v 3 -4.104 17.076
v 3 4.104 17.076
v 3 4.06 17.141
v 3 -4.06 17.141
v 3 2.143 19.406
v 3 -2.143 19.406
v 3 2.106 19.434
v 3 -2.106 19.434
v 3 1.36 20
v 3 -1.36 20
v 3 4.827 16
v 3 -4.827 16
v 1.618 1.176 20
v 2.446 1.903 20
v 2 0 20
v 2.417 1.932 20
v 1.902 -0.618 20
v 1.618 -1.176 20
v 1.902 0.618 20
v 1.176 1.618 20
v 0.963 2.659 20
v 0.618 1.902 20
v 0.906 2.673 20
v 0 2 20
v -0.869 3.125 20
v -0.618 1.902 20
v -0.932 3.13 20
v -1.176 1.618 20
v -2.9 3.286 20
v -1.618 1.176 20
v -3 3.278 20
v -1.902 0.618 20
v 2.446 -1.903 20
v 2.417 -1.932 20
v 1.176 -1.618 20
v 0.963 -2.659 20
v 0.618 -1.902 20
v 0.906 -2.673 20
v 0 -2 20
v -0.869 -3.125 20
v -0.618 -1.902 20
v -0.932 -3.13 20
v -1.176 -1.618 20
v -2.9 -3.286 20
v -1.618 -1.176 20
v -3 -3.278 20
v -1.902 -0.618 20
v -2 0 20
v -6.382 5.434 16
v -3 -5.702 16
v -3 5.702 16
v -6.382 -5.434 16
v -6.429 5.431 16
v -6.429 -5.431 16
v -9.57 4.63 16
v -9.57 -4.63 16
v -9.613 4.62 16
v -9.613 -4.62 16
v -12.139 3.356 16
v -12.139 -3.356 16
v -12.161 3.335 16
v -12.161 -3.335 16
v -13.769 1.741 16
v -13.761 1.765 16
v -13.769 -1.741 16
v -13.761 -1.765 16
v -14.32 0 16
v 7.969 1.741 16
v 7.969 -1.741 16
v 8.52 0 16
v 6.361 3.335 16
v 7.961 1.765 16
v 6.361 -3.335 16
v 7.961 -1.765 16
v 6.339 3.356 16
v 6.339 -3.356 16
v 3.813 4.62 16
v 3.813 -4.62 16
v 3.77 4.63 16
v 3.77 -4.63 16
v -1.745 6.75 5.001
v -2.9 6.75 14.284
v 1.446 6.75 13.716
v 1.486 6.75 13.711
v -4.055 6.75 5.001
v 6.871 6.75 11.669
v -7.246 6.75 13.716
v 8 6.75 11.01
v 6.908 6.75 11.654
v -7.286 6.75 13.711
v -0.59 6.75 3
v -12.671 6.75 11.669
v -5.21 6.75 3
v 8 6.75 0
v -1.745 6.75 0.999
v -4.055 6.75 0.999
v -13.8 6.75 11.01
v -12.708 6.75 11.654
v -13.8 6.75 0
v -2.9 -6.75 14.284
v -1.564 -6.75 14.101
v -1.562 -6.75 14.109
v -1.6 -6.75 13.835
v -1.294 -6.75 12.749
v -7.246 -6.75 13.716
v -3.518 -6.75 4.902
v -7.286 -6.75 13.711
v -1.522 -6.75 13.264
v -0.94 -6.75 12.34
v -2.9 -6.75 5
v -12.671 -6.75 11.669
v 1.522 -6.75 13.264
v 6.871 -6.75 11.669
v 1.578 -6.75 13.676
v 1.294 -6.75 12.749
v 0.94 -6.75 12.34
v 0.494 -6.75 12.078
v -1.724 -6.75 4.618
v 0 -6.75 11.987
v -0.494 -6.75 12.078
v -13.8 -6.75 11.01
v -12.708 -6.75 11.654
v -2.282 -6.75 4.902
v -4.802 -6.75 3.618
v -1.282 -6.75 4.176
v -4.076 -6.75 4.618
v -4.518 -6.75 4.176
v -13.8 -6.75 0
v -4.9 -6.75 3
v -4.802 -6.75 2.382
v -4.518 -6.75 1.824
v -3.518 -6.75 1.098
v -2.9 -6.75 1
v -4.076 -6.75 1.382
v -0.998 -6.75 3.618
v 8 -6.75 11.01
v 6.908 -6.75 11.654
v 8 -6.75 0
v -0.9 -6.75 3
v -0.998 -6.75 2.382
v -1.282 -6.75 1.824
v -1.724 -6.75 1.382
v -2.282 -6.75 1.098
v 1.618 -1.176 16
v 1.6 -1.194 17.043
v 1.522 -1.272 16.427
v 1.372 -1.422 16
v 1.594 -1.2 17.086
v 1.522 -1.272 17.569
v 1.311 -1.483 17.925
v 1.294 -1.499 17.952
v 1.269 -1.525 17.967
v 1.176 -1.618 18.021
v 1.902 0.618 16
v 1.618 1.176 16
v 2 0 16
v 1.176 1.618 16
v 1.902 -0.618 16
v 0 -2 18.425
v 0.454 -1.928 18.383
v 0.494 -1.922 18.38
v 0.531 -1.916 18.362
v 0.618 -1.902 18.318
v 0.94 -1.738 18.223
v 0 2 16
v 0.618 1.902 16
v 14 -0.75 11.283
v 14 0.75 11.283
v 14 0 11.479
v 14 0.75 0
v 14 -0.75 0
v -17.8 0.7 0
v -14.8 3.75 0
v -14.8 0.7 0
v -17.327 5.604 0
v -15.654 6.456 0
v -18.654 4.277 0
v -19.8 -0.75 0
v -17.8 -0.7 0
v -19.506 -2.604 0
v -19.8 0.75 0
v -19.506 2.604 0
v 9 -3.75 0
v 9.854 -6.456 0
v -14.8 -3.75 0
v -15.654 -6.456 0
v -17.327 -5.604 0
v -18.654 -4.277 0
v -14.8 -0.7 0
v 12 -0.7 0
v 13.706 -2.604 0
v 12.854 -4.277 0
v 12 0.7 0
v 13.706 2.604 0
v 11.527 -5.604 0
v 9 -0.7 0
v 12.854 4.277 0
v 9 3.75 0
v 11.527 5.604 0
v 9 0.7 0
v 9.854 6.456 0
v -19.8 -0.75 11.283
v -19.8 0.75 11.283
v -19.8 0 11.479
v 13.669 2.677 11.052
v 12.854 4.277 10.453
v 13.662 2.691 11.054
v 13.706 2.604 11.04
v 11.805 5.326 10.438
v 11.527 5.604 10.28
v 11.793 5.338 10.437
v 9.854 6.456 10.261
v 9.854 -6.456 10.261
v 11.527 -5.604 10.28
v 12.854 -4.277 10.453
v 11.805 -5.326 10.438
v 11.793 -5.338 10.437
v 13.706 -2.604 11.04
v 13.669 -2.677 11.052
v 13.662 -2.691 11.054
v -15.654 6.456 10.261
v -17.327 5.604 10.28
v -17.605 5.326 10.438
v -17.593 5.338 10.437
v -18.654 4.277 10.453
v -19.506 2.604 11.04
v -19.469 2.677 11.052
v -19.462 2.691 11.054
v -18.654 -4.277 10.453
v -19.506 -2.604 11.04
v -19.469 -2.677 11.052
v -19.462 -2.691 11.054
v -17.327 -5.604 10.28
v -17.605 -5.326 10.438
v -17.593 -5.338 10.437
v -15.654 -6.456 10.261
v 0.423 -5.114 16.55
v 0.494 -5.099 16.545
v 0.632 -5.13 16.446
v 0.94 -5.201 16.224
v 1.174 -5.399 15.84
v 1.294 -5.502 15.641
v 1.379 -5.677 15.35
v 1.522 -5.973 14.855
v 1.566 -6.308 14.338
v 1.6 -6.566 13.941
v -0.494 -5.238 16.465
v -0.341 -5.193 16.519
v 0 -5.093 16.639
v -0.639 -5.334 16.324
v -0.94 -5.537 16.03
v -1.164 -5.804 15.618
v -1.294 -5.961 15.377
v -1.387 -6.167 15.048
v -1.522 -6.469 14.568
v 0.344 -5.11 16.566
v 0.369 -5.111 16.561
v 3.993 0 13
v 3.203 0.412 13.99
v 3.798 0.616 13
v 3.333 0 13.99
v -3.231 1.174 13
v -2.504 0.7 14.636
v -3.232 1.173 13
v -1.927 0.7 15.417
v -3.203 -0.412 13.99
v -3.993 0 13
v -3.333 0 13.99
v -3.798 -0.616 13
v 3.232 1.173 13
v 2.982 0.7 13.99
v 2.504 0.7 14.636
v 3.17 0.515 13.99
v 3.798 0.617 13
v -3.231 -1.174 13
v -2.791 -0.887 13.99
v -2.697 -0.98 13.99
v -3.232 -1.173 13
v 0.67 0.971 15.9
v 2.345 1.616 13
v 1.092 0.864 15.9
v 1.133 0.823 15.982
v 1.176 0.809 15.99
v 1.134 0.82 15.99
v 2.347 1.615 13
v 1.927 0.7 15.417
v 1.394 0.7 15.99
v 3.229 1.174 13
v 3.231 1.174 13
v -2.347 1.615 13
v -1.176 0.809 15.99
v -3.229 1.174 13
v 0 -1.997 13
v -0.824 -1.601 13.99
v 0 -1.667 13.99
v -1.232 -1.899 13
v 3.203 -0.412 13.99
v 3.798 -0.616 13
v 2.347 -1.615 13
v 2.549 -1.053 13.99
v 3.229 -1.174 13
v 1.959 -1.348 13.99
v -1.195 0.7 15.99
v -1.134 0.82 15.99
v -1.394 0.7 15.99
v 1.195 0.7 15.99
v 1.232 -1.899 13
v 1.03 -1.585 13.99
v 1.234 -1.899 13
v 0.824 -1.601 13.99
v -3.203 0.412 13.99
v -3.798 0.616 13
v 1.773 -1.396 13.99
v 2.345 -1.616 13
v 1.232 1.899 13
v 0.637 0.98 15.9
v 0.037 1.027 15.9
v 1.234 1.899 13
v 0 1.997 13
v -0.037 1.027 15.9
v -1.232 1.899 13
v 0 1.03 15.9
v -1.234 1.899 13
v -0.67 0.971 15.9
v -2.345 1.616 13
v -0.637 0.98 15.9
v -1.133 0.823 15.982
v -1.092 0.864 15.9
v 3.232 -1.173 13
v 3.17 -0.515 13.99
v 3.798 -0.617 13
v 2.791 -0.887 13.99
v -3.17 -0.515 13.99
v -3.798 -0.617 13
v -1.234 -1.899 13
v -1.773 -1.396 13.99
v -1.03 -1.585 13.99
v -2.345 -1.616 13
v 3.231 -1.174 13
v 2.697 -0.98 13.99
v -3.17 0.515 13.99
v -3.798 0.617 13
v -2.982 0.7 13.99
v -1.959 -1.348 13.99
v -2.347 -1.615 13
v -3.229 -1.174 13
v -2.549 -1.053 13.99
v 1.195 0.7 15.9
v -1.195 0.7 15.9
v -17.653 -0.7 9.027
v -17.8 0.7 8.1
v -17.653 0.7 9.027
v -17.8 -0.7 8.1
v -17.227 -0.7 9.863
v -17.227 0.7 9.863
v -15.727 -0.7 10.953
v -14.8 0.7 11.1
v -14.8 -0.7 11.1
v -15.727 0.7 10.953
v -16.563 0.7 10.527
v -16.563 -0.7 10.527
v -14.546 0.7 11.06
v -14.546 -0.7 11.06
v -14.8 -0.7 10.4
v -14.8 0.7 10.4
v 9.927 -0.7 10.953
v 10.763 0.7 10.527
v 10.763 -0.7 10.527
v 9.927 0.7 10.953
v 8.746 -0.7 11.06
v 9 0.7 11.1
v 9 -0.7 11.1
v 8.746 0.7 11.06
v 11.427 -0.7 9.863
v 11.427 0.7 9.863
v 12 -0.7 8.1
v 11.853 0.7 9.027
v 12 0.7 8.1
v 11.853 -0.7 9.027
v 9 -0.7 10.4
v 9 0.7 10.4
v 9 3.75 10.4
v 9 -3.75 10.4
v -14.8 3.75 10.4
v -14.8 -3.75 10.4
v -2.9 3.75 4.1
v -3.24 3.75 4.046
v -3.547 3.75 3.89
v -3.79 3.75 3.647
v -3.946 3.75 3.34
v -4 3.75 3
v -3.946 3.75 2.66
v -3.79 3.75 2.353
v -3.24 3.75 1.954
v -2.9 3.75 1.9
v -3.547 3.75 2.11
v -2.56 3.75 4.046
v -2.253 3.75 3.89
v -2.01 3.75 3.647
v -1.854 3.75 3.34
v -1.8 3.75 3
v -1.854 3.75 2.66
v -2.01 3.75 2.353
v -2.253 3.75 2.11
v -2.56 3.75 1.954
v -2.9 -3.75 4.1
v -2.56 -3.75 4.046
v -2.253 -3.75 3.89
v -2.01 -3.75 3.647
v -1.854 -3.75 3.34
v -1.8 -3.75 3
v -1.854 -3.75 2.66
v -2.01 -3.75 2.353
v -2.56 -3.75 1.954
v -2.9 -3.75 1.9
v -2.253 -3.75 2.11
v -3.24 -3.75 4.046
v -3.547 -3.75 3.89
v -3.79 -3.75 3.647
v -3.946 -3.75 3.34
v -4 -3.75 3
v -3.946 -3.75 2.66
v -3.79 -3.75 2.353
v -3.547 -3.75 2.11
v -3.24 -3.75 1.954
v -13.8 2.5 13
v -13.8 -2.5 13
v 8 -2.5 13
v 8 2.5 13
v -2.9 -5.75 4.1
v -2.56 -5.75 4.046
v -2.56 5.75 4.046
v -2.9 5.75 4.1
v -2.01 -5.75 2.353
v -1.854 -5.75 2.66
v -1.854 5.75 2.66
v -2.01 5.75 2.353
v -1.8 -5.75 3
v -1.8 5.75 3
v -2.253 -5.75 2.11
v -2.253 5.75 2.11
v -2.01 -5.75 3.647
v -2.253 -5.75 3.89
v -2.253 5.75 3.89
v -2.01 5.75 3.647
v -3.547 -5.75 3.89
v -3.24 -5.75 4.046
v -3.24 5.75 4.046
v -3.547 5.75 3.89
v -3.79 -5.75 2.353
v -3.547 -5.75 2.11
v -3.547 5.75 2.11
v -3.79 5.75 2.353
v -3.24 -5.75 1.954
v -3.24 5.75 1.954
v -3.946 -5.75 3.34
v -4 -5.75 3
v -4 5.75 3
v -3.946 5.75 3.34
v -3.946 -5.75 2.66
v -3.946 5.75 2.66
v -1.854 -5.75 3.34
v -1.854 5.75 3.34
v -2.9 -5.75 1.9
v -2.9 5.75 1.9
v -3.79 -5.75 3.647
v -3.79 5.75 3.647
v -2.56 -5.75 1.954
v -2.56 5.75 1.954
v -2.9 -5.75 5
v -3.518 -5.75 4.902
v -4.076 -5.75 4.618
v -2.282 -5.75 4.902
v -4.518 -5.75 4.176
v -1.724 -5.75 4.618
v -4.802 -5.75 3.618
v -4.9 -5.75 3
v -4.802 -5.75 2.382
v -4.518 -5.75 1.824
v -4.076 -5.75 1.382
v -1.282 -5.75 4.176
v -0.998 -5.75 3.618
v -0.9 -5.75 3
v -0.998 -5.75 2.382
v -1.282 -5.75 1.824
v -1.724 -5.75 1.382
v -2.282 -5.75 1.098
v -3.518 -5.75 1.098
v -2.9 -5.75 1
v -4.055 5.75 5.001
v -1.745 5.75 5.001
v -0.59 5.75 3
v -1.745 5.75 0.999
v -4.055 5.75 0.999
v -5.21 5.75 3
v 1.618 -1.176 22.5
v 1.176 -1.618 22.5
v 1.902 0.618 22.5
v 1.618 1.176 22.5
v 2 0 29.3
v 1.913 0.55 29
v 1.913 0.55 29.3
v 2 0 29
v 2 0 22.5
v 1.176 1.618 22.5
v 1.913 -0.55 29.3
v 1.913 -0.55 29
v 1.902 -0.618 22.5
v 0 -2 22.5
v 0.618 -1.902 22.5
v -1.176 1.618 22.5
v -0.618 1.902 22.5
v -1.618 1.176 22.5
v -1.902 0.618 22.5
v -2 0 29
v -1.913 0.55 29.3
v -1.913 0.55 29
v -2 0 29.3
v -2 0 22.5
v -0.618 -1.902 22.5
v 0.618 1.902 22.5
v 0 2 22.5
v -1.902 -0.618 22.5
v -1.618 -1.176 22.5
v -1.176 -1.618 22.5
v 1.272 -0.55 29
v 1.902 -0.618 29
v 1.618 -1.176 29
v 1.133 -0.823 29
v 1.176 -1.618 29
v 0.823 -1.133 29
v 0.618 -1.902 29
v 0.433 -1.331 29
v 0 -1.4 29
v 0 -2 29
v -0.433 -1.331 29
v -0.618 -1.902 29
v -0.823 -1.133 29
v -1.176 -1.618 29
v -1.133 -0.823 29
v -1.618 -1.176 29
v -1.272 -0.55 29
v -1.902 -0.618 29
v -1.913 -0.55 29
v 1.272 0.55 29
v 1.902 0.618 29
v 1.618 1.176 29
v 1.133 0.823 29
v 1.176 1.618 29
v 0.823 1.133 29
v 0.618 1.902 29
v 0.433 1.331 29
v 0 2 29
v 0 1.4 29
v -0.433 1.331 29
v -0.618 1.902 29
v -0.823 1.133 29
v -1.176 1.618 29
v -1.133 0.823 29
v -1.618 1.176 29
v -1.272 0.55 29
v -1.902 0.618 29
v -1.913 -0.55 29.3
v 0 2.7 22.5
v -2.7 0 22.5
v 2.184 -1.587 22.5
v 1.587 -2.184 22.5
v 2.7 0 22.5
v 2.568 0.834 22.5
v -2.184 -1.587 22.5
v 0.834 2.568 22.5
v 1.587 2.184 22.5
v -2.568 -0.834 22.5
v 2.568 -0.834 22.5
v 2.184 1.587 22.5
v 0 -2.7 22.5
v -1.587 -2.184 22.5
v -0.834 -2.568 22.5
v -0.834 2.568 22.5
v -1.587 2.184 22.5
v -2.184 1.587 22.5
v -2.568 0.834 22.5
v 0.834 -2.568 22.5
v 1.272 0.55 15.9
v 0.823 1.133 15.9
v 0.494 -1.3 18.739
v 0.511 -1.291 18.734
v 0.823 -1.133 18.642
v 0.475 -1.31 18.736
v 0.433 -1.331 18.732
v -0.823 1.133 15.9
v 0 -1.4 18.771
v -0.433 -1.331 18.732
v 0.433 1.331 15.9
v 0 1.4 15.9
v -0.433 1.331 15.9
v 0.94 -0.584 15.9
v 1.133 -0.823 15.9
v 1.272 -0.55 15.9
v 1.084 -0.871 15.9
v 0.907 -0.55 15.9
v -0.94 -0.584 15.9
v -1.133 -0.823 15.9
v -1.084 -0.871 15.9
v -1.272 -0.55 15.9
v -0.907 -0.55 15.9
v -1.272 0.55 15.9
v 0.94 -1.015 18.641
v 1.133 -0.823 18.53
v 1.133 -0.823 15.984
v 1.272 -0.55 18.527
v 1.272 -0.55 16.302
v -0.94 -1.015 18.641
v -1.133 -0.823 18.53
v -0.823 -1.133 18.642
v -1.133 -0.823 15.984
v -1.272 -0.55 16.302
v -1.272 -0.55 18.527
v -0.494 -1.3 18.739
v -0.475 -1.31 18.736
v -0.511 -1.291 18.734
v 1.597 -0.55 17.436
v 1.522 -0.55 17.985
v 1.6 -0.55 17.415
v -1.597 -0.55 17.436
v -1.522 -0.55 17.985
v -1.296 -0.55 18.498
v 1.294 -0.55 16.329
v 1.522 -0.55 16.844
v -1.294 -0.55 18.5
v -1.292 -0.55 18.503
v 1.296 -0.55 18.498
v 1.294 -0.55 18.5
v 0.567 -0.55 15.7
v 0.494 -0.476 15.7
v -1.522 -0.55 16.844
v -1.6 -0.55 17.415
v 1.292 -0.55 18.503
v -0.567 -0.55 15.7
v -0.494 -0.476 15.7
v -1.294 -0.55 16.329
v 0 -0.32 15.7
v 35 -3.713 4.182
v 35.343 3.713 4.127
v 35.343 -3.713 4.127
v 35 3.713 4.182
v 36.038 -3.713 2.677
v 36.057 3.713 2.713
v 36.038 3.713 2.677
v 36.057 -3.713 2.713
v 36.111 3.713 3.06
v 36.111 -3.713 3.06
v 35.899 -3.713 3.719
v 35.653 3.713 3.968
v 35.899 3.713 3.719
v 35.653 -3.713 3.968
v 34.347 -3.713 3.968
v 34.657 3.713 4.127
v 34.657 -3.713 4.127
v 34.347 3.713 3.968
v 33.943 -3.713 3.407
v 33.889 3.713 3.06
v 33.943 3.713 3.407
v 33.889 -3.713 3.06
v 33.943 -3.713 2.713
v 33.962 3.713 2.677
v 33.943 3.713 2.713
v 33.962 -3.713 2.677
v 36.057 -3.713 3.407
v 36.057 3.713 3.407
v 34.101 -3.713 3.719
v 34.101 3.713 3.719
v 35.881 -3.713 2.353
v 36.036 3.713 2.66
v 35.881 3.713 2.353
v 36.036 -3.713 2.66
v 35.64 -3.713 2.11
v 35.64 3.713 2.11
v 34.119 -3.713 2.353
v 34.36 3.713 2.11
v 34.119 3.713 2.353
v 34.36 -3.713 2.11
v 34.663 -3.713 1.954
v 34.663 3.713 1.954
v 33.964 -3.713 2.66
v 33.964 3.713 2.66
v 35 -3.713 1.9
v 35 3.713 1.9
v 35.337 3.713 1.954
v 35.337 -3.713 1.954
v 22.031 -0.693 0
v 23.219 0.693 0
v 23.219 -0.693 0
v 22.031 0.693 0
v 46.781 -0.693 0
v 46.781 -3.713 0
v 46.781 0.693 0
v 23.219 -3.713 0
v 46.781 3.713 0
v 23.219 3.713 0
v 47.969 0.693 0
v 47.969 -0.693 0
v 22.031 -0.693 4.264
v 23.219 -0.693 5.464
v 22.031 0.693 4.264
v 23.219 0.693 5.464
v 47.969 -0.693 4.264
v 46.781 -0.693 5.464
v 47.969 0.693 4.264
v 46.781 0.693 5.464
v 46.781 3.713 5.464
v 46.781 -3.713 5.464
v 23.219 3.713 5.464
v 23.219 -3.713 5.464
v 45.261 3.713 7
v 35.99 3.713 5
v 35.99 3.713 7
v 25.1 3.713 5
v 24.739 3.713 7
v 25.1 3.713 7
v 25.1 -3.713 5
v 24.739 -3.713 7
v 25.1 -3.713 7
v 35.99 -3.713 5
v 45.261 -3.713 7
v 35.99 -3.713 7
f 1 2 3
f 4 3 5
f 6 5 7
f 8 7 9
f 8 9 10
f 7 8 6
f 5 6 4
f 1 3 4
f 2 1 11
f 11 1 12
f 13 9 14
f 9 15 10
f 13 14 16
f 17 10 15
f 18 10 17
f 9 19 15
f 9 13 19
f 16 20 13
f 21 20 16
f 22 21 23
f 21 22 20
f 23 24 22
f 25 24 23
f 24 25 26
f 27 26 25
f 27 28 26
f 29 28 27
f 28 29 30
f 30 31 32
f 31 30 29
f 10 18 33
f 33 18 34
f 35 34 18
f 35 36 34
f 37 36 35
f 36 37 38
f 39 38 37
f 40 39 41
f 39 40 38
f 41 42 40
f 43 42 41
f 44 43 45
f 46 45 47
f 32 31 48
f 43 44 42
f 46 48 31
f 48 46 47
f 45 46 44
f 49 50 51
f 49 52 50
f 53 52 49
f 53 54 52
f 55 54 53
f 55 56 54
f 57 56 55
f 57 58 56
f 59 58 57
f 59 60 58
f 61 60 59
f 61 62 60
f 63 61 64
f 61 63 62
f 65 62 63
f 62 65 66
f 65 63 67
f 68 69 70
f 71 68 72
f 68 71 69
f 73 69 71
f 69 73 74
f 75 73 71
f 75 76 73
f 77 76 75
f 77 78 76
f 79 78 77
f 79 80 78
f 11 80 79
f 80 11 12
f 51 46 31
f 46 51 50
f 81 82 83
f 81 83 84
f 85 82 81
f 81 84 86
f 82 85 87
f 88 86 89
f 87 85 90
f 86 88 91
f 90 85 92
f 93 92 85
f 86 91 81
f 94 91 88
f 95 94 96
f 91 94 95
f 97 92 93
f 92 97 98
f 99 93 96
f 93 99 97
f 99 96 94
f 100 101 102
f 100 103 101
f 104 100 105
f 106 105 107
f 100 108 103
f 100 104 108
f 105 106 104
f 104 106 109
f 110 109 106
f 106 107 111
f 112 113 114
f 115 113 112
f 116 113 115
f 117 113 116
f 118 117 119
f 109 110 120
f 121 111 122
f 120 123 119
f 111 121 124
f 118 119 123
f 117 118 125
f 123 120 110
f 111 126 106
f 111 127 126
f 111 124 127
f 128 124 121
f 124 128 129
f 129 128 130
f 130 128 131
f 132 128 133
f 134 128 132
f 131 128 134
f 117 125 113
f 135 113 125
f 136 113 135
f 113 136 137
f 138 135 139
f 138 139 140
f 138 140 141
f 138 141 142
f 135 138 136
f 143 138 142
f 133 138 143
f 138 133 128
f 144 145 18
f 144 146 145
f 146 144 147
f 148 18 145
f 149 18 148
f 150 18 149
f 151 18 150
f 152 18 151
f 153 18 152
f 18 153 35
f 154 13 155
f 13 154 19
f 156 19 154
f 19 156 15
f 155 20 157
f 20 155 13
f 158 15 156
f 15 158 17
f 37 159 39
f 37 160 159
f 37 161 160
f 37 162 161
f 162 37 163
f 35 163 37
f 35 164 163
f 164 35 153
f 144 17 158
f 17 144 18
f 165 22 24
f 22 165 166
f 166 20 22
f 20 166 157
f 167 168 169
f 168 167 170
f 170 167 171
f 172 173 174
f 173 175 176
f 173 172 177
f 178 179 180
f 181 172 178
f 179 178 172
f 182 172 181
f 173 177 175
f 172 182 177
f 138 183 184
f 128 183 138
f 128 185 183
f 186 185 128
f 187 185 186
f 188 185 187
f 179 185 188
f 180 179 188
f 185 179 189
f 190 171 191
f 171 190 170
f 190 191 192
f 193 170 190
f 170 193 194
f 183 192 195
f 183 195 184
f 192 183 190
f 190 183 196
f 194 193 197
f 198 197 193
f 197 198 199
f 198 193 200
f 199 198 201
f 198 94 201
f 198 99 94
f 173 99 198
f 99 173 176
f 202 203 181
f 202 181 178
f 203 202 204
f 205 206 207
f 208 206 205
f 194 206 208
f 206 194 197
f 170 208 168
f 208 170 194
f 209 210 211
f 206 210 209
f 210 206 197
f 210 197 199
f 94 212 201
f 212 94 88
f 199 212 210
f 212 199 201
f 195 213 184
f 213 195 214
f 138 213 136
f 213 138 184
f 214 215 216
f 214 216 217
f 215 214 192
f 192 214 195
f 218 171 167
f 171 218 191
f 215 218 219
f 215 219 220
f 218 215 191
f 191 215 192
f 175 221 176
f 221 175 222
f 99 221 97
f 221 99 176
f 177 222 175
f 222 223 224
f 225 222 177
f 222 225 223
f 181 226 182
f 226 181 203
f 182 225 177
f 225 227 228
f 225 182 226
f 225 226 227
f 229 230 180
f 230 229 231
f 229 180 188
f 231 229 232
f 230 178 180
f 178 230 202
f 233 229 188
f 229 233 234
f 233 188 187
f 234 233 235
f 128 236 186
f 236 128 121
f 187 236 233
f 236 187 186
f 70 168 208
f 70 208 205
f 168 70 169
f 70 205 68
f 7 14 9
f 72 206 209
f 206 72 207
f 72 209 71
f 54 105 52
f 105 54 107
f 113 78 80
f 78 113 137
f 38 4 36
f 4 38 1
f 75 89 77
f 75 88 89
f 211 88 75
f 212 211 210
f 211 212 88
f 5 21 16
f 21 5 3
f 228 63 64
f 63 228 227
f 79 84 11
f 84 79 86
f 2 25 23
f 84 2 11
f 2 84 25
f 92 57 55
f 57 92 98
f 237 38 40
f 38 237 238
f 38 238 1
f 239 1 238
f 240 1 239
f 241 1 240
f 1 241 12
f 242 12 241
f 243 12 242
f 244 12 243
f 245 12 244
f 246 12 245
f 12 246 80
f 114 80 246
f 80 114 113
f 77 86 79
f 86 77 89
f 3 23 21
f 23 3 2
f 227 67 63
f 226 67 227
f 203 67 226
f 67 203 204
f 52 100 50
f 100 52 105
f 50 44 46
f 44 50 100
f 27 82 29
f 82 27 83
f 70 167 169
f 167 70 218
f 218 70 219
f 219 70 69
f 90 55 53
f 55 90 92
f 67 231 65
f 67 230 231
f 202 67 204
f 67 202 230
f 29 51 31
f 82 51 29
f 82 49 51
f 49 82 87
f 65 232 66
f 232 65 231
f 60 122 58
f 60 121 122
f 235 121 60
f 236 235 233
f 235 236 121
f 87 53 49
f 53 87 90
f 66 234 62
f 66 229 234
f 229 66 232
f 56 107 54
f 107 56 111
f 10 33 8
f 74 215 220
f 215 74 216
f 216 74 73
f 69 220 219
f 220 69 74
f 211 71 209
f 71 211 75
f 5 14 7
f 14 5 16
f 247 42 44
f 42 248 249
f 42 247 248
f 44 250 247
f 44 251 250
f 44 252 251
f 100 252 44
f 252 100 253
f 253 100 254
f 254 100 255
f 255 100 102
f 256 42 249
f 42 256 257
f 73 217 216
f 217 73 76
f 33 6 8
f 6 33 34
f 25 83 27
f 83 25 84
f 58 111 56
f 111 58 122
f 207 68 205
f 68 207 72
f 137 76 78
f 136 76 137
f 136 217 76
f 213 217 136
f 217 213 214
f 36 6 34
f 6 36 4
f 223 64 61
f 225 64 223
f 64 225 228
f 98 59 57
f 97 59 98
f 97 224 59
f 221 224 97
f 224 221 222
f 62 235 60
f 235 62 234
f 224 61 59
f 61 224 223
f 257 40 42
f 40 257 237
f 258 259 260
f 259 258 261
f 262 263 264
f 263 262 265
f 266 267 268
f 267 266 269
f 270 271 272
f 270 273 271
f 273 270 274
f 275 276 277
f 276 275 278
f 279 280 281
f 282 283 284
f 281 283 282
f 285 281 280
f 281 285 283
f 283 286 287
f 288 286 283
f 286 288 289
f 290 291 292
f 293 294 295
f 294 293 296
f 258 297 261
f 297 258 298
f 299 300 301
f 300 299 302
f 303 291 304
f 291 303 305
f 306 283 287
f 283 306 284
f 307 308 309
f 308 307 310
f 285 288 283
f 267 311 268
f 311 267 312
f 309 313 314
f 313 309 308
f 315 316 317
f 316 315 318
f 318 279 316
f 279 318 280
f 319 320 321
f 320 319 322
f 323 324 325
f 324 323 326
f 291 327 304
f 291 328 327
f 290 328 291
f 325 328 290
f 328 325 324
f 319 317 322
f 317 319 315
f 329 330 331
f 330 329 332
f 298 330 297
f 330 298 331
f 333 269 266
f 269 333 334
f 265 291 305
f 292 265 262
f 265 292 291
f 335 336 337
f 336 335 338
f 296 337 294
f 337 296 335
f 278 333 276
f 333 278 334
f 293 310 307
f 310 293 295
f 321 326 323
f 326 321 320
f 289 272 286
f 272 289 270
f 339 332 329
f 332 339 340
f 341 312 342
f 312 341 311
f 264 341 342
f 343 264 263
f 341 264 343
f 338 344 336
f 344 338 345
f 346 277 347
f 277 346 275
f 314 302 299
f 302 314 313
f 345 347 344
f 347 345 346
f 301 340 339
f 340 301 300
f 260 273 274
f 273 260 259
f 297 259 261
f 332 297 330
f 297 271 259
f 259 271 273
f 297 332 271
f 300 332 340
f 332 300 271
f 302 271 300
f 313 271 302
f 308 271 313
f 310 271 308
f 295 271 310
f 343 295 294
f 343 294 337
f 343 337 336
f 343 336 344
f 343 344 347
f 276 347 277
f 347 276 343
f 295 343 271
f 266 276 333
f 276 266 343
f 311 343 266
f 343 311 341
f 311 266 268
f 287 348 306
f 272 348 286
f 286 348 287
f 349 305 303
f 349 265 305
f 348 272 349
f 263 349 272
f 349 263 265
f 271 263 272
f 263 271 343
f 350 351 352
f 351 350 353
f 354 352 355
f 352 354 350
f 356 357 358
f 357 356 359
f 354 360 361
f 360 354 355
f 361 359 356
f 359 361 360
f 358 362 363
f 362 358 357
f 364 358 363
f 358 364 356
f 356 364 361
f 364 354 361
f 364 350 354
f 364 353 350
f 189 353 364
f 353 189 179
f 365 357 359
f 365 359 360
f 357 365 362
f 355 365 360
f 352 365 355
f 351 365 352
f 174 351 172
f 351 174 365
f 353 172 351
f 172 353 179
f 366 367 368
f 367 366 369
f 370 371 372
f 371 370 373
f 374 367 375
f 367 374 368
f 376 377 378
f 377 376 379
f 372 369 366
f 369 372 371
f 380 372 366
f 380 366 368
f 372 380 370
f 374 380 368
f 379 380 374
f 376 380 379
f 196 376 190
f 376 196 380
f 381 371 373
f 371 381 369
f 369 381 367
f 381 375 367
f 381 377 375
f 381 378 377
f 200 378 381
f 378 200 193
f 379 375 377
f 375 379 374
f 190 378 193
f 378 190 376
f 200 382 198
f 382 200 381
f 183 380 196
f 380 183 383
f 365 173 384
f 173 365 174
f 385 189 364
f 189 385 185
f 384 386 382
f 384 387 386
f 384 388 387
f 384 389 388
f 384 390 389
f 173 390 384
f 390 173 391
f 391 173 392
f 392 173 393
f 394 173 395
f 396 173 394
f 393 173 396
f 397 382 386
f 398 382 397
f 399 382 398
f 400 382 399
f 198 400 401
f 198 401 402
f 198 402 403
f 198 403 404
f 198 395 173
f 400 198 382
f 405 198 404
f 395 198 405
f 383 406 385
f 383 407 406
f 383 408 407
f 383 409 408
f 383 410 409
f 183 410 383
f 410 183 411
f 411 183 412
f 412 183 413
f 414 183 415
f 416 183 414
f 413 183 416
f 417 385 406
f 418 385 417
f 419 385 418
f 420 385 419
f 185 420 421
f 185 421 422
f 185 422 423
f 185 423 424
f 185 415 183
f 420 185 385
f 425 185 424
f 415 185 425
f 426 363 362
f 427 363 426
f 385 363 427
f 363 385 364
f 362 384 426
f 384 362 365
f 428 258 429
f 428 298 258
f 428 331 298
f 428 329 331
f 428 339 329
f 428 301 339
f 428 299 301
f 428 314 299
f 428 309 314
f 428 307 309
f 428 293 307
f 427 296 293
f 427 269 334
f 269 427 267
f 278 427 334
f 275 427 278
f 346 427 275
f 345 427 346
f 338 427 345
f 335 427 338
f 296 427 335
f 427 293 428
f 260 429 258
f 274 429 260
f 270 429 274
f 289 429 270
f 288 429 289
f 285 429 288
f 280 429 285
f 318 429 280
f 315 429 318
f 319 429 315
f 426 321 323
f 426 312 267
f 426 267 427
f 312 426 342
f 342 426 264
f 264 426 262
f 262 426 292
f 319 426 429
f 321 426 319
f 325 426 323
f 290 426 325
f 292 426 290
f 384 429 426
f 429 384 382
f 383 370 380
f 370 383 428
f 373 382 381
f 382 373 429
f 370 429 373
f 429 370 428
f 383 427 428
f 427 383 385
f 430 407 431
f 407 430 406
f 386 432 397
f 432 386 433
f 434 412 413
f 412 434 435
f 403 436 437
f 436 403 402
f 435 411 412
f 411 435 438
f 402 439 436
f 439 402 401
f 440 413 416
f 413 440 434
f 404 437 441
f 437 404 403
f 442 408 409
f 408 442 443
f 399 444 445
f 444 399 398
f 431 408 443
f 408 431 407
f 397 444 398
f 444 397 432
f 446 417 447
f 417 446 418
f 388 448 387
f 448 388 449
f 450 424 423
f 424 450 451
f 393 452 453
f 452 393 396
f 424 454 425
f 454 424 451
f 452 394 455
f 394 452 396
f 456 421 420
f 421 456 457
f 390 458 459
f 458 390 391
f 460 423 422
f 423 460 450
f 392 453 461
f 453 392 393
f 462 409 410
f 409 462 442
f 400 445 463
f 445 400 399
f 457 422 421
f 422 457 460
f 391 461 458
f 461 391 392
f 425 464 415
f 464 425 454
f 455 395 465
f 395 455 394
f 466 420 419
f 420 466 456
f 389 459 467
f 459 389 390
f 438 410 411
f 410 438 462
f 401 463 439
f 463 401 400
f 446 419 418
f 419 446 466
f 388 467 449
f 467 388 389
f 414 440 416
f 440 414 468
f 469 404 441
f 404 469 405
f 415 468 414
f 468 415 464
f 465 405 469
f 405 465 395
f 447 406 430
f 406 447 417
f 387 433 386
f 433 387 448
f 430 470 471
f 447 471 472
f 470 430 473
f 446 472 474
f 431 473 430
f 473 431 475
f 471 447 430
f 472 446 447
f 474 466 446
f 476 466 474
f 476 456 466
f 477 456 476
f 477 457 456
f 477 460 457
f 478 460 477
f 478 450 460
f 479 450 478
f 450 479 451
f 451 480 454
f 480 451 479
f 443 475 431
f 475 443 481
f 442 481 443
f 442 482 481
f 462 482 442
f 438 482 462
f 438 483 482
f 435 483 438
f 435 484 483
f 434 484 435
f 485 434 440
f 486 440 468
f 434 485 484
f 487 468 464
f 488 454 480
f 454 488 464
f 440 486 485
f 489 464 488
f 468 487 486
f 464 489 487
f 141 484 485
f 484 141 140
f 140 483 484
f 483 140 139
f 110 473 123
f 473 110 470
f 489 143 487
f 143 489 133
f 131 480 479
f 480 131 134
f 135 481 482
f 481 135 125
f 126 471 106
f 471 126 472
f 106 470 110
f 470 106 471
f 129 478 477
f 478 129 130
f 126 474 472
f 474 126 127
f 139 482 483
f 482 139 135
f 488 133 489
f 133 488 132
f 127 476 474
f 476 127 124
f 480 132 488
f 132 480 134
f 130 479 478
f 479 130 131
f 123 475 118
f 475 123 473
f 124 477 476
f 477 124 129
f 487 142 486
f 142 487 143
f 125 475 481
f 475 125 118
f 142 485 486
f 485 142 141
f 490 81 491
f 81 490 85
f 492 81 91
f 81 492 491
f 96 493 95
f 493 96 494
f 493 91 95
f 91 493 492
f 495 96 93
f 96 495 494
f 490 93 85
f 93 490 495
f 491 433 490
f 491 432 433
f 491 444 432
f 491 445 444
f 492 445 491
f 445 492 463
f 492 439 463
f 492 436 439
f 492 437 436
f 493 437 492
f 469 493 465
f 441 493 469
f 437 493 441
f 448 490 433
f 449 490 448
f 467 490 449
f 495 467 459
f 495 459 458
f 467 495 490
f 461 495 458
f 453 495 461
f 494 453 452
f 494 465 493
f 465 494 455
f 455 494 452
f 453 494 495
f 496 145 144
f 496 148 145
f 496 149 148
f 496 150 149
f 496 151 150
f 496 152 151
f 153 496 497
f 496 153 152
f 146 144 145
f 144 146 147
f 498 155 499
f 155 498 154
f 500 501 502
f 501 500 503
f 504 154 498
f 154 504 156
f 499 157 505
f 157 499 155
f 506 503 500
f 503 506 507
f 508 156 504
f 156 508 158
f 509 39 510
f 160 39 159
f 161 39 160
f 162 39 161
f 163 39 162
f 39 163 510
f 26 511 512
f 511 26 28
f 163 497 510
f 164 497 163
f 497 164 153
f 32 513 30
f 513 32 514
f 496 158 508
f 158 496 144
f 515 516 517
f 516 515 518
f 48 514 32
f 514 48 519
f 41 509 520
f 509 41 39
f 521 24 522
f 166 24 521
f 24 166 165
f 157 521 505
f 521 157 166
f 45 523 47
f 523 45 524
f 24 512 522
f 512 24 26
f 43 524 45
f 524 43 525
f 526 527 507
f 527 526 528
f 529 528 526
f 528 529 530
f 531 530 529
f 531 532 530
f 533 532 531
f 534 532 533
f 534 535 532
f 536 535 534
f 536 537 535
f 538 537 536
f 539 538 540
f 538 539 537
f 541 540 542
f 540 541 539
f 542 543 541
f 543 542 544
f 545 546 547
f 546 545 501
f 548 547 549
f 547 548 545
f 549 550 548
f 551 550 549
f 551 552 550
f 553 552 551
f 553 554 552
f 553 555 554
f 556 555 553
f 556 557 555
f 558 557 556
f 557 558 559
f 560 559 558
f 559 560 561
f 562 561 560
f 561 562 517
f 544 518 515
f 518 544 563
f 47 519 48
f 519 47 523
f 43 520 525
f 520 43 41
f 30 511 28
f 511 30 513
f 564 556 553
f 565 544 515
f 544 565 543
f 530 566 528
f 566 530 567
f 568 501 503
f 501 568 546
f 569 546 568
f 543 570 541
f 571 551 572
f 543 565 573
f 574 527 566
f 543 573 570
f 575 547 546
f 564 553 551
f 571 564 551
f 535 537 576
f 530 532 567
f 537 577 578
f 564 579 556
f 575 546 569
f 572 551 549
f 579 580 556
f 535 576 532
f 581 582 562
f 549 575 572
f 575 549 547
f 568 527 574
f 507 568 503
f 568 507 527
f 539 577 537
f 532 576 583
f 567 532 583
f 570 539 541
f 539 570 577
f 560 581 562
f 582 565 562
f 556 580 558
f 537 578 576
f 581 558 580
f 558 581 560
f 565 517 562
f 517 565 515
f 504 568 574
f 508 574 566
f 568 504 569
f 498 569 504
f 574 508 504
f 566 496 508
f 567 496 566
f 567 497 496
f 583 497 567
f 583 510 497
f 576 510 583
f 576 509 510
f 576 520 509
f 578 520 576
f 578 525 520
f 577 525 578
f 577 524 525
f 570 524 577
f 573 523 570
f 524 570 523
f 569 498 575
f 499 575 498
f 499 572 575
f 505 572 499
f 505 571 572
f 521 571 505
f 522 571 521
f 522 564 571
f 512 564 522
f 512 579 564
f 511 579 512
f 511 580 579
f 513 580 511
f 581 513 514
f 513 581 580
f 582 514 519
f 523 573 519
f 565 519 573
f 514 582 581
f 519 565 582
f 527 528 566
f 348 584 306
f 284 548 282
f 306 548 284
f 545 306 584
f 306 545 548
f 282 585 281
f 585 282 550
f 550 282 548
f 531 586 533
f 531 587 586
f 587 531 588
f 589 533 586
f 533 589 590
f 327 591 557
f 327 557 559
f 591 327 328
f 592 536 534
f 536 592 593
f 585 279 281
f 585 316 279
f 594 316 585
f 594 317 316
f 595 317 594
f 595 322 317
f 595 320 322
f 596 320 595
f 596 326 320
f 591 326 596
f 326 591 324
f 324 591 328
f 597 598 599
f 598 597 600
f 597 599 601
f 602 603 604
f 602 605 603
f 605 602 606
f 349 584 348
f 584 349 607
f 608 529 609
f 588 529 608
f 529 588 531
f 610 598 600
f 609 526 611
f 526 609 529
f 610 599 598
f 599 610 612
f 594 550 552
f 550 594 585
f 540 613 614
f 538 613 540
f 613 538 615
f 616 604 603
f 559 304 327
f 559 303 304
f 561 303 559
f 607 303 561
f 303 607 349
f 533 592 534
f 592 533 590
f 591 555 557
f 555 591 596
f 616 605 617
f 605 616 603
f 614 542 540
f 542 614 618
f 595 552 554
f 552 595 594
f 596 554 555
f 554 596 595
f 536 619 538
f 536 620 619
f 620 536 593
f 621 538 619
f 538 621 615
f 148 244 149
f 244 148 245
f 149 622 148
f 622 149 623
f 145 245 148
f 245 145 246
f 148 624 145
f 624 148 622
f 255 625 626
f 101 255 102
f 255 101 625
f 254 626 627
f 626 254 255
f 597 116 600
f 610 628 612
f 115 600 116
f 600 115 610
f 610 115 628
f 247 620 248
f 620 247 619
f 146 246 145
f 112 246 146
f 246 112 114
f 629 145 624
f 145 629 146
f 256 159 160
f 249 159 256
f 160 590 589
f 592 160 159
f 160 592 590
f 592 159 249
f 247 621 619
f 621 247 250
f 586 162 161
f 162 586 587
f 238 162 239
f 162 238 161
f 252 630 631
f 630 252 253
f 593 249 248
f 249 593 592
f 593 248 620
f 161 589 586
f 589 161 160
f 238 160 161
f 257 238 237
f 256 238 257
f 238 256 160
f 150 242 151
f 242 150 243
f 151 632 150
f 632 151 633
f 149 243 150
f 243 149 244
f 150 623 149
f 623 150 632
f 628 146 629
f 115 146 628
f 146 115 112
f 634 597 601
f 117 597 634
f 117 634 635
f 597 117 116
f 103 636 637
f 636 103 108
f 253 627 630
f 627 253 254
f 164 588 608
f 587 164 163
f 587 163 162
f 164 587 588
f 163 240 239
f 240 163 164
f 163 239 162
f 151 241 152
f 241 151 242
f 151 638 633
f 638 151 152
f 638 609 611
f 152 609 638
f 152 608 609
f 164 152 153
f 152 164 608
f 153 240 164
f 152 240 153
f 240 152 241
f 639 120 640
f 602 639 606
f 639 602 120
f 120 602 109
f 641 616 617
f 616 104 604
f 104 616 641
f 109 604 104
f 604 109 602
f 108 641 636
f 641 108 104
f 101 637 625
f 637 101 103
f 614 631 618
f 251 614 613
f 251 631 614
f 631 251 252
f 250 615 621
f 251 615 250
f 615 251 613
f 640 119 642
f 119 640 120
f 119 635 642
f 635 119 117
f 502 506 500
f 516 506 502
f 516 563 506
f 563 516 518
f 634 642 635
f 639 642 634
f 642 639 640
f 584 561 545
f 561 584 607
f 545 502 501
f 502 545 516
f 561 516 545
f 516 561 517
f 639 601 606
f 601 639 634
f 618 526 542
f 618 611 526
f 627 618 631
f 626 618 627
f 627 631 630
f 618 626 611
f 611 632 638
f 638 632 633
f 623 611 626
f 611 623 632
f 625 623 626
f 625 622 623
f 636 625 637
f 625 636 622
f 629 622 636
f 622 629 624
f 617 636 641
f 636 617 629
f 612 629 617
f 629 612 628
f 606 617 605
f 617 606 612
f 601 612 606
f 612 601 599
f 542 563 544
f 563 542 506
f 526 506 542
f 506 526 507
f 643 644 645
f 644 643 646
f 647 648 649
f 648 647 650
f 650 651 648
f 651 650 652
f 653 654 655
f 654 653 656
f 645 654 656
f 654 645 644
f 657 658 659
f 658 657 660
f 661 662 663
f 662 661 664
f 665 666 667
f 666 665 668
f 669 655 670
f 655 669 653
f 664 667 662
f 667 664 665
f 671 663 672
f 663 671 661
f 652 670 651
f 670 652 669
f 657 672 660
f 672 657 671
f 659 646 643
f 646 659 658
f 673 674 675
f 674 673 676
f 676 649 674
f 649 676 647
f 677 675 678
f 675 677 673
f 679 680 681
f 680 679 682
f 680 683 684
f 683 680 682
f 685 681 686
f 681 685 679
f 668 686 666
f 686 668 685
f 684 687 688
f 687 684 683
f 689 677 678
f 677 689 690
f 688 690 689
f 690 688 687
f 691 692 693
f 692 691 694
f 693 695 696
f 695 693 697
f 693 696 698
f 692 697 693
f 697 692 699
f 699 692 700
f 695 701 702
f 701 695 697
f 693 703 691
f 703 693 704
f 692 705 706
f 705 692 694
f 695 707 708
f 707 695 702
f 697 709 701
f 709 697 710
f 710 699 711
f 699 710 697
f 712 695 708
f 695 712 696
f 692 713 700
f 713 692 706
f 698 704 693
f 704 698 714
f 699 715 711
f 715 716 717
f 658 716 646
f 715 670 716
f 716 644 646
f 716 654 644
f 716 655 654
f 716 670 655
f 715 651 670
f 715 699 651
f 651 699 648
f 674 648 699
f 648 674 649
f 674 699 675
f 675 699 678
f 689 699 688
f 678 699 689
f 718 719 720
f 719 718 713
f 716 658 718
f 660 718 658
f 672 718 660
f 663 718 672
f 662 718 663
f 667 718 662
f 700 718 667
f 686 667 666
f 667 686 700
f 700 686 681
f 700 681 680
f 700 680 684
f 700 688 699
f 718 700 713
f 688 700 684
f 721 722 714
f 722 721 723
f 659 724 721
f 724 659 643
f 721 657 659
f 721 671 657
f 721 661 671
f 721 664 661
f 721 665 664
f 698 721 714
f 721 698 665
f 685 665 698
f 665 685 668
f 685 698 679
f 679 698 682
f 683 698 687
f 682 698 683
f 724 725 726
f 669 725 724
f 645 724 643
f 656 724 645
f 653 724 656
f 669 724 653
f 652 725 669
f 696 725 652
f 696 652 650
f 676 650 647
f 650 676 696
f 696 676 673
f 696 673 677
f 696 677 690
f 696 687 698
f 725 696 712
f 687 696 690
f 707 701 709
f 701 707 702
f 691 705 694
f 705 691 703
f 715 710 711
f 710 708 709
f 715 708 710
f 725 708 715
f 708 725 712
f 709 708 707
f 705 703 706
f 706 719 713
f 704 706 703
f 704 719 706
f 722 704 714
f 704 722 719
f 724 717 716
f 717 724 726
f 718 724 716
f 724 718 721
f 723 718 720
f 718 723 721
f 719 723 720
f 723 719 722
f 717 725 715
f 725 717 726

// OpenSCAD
////use $fn=1000 for manufacturing. 
// rendering with 1K facet number is taking 8 minutes
$fn=20; 

// mic dimentions
    hHousing=2.6;
    hBottomBox=hHousing*4;
    hMicSpace=3;
    rCable=0.7;
    rBendCable=3;
    bottomL=23.8;
    bottomW=7.5;
    topL=21.8;
    topW=5;
    dw=3; // wall width at W
    dl=2; // wall width at L
    
    speakerAngle=120;

// tip dimensions
    ht=13;        // hight of tip from top of main housing
    r1t=2.7;      // bottom radius of the tip
    r2t=2;      // top radious of the tip
    rTipHole=r2t*0.7; // radious of tip hole
//tips();
//backPlate();
//drawWithCut(0,5,18);
drawAll();
bottom();
//tips();
//mic();
//micHousing();
//micOuter();
//trim2(0,5,6,10);
 module bottom()
 {
     dy=9;
     dx=30;
     translate([dx+5,0,0])
     difference()
     {
     translate([-dx/2,-dy/2,0])
     cube([dx,dy,7]);

     scale([1.01,1.01,1.02])
     snipPins();

     scale([0.99,0.99,1])
{
    translate([(topL/2-8),0,0])
     drawAll();

     snipPins();

    translate([bottomL/2+2*rBendCable-2*rCable-0.4,rCable,hBottomBox-rBendCable+rCable])
    cableBend();

    translate([-bottomL/2-2*rBendCable+2*rCable+0.4,rCable,hBottomBox-rBendCable+rCable])
    cableBend();

    translate([bottomL/2+2*rBendCable-2*rCable-3,rCable,hBottomBox-3])
    rotate([0,45,0])     
    cube([5,10,5],center=true);
         
    translate([-(bottomL/2+2*rBendCable-2*rCable-3),rCable,hBottomBox-3])
    rotate([0,-45,0])     
    cube([5,10,5],center=true);

     translate([-8-2,-dy/2-1,5])
         cube([11,dy+2,3]);
     }
         }
         
 }

module torus(r1=10.2,r2=2.2)
{
  rotate_extrude()
    translate([(r1-r2)/2, 0, 0])
        circle(r = r2/2);
}

module drawAll()
{
    difference()
    {
    union()
    {
      mic();
      translate([0,0,hHousing+hBottomBox+hMicSpace])
      tips();
    }
    translate([0,0,hHousing+hBottomBox+hMicSpace])
    tipHoles();
    }
    
    tipWall();
}

module tips()
{
  tip();
}

module tipHoles()
{
    dh1=4;
    st0=0.6;

    h0=ht+(dh1)*sin(speakerAngle);
      // re-drill both holes
      translate([0,0,-0.1])
      cylinder(h=ht+2,r=rTipHole);

      translate([0,0,r2t*sin(speakerAngle)])
      rotate([speakerAngle,0,0])
      cylinder(h=h0,r=rTipHole+0.2);      
}

module tipWall()
{
    translate([0,0,ht/2+hHousing+hBottomBox+hMicSpace])
    difference()
    {
    cube([r2t*2,1.1,ht+0.6],center=true);
    translate([0,0,-ht/2-2])
    difference()
    {
    cylinder(h=ht+4,r=2*r2t);
    cylinder(h=ht+4,r=r2t);
    }
    }
}

module mic()
{
    translate([-(topL/2-8),0,0])
    difference()
    {
        micOuter();
        micHousing();
      snipPins();
    }
}

module micOuter()
{
    rTrim=6;
    l=bottomL+2*rBendCable+dl*2; // 1.5mm wall width from cable bend
    w=bottomW+dw*2; // 3mm wall width
    translate([-l/2,-w/2,0])
    difference()
    {
        union()
        {
        cube([l,w,hHousing+hBottomBox+hMicSpace]);
        
        // upper cube to connect tips
    translate([(topL/2-8)+topL/2+2*r2t+r2t,w/2,hHousing+hBottomBox+hMicSpace])
    {
          difference()
          {
            translate([-r2t-1,-w/2,0])
              cube([2*r2t+2,w,2*r2t]);
            cylinder(h=2*r2t,r=r2t);          
          }
      }  
  }      
        trim2(0,rTrim,l,w,hHousing+hBottomBox+hMicSpace);
        trim2(-90,rTrim,l,2*rTrim,hHousing+hBottomBox+hMicSpace);
        trim2(90,rTrim,2*rTrim,w,hHousing+hBottomBox+hMicSpace);
        trim2(180,rTrim,2*rTrim,2*rTrim,hHousing+hBottomBox+hMicSpace);
    translate([l/2,w/2,4])
    scale([1,0.5,1])
        difference()
        {
            cylinder(
                h=6*hHousing+hBottomBox+hMicSpace,
                r1=1.2*bottomL,
                r2=bottomL/2);
            cylinder(
                h=3*hHousing+hBottomBox+hMicSpace,
                r1=1.2*bottomL/1.1,
                r2=bottomL/88);
        }
    }
}

module trim2(teta,r,l,w,h)
{
    translate([l-r,w-r,0])
    rotate([0,0,teta])
    {
    difference()
    {
     cube([r+0.01,r+0.01,h]);
     cylinder(h=h,r=r);
    }
/*     translate([0,0,h-r])
    difference()
    {
        cube(r,center);
     sphere(r);
    }*/
}
}

module micHousing()
{
    // bottom large box
    translate([-bottomL/2,-bottomW/2,0])
    cube([bottomL,bottomW,hBottomBox]);

    // top part for the mic
    translate([0,0,hBottomBox])
    cube2(hHousing,bottomL,bottomW,topL,topW);
    
    // space
    translate([topL/2-8,0,hBottomBox+hHousing-0.01])
    difference()
    {
    scale([1,0.5,1])
    cylinder(h=hMicSpace,r1=topW-1,r2=2);
    translate([-10,-20+0.7,1])
    cube(20);
    }
    
    // right cable bend
    translate([-bottomL/2,rCable,hBottomBox-rBendCable+rCable])
    cableBend();

    // left cable bend
    translate([bottomL/2,rCable,hBottomBox-rBendCable+rCable])
    cableBend();
}

module cableBend()
{
    h0=(hBottomBox-rBendCable+rCable)+0.1;
    rotate([90,0,0])
    linear_extrude(2*rCable)
    circle(r=rBendCable);

    translate([-rBendCable,-rCable*2,-h0])
    cube([2*rBendCable,2*rCable,h0]);
}

module cube2(h,bottomL,bottomW,topL,topW)
{
    w=bottomW;
    dw=(bottomW-topW)/2;
    l=bottomL;
    dl=(bottomL-topL)/2;
    translate([-l/2,-w/2,0])
    polyhedron(
       points= [
        [0,0,0],
        [0,w,0],
        [l,w,0],
        [l,0,0],
        [dl,dw,h],
        [dl,w-dw,h],
        [l-dl,w-dw,h],
        [l-dl,dw,h]],
      faces=[
          [0,1,2,3],  // bottom
          [4,5,1,0],  // front
          [7,6,5,4],  // top
          [5,6,2,1],  // right
          [6,7,3,2],  // back
          [7,4,0,3]] // left
        );
}

module tip()
{
  cylinder(h=ht,r=r2t);
  translate([0,0,ht/2])
    cylinder(h=ht/2,r1=r1t,r2=r2t);
}

module drawWithCut(x=0,y=0,z=0)
{
    difference()
    {
        drawAll();
        translate([-50+x, -50+y,z])
        //translate([0,0.75,0])
          cube([100, 50, 50]);
    }
}

module testChamber()
{
    scale([1,yScale,1])
    difference()
    {
    cylinder(h=40,r=ld+3);
        
    translate([0,0,20])
      cylinder(h=40,r=sd);
    
    translate([0,0,h0+ht+21.7])
    rotate([180,0,0])
    outerBulk();
    }
}

module tipBlocker()
{
    tolerance=0.04;
    difference()
    {
    cylinder(h=5,r=4);
    translate([0,0,h0+ht+3])
    rotate([180,0,0])
    scale([1+tolerance,1+tolerance,1])
    draw2();
    translate([0,0,h0+ht+3])
    rotate([180,0,0])
    scale([1-tolerance,1-tolerance,1])
    draw2();
    }
}

module circularWallWithGap(height=2,innerRadius=11,width=1,
gapAngle=90)
{
    difference()
    {
        cylinder(h=height,r1=innerRadius+width,r2=innerRadius+width,center=false);
        cylinder(h=height,r1=innerRadius,r2=innerRadius,center=false);
        //translate([20,-innerRadius*1.5,0])
        //cube([3*innerRadius,3*innerRadius,height]);
    }
}

module snipPins(lowerHead=1)
{
    
    sx=0;
    sy=0;

    snipPin(sx,sy, lowerHead);
}


module snipPin(x=0,y=0,lowerHead=1)
{
    y0=-bottomW/2-dw+1;
    // M3 screw, 5mm
    translate([x,y0,3])
    rotate([-90,0,0])
    cylinder(h=20,r1=1.1,r2=1.1);
    
    translate([x,y0-2,3])
    rotate([-90,0,0])
    cylinder(h=2,r1=2,r2=2);

    // head space at the bottom
    if(lowerHead==1)
    {
    // one edge is 4mm.
    translate([x,-y0,3])
    rotate([-90,0,0])
    cylinder(h=1,r=2.31,$fn=6);
    //linear_extrude(20)    circle(2.31,$fn=6);
    }        
}

module backPlate()
{
    t0=3.5*hHousing;
    t1=1.5;
    h0=3;
    
    difference()
    {
      micOuter();
      translate([0,0,100+t0])
      cube([200,200,200],center=true);
      translate([(topL/2-8),0,t1])
        drawAll();
        
    translate([0,0,t1])
        snipPins();
      
    // top part for the mic
    translate([0,0,t0+0.01])
    rotate([180,0,0])
    cube2(hHousing,bottomL,bottomW,topL,topW);

      //remove space for cable
      translate([rCable-bottomL/2-rBendCable,-rCable,t1])
      cube([2*rCable,2*rCable,6]);
    }
}
